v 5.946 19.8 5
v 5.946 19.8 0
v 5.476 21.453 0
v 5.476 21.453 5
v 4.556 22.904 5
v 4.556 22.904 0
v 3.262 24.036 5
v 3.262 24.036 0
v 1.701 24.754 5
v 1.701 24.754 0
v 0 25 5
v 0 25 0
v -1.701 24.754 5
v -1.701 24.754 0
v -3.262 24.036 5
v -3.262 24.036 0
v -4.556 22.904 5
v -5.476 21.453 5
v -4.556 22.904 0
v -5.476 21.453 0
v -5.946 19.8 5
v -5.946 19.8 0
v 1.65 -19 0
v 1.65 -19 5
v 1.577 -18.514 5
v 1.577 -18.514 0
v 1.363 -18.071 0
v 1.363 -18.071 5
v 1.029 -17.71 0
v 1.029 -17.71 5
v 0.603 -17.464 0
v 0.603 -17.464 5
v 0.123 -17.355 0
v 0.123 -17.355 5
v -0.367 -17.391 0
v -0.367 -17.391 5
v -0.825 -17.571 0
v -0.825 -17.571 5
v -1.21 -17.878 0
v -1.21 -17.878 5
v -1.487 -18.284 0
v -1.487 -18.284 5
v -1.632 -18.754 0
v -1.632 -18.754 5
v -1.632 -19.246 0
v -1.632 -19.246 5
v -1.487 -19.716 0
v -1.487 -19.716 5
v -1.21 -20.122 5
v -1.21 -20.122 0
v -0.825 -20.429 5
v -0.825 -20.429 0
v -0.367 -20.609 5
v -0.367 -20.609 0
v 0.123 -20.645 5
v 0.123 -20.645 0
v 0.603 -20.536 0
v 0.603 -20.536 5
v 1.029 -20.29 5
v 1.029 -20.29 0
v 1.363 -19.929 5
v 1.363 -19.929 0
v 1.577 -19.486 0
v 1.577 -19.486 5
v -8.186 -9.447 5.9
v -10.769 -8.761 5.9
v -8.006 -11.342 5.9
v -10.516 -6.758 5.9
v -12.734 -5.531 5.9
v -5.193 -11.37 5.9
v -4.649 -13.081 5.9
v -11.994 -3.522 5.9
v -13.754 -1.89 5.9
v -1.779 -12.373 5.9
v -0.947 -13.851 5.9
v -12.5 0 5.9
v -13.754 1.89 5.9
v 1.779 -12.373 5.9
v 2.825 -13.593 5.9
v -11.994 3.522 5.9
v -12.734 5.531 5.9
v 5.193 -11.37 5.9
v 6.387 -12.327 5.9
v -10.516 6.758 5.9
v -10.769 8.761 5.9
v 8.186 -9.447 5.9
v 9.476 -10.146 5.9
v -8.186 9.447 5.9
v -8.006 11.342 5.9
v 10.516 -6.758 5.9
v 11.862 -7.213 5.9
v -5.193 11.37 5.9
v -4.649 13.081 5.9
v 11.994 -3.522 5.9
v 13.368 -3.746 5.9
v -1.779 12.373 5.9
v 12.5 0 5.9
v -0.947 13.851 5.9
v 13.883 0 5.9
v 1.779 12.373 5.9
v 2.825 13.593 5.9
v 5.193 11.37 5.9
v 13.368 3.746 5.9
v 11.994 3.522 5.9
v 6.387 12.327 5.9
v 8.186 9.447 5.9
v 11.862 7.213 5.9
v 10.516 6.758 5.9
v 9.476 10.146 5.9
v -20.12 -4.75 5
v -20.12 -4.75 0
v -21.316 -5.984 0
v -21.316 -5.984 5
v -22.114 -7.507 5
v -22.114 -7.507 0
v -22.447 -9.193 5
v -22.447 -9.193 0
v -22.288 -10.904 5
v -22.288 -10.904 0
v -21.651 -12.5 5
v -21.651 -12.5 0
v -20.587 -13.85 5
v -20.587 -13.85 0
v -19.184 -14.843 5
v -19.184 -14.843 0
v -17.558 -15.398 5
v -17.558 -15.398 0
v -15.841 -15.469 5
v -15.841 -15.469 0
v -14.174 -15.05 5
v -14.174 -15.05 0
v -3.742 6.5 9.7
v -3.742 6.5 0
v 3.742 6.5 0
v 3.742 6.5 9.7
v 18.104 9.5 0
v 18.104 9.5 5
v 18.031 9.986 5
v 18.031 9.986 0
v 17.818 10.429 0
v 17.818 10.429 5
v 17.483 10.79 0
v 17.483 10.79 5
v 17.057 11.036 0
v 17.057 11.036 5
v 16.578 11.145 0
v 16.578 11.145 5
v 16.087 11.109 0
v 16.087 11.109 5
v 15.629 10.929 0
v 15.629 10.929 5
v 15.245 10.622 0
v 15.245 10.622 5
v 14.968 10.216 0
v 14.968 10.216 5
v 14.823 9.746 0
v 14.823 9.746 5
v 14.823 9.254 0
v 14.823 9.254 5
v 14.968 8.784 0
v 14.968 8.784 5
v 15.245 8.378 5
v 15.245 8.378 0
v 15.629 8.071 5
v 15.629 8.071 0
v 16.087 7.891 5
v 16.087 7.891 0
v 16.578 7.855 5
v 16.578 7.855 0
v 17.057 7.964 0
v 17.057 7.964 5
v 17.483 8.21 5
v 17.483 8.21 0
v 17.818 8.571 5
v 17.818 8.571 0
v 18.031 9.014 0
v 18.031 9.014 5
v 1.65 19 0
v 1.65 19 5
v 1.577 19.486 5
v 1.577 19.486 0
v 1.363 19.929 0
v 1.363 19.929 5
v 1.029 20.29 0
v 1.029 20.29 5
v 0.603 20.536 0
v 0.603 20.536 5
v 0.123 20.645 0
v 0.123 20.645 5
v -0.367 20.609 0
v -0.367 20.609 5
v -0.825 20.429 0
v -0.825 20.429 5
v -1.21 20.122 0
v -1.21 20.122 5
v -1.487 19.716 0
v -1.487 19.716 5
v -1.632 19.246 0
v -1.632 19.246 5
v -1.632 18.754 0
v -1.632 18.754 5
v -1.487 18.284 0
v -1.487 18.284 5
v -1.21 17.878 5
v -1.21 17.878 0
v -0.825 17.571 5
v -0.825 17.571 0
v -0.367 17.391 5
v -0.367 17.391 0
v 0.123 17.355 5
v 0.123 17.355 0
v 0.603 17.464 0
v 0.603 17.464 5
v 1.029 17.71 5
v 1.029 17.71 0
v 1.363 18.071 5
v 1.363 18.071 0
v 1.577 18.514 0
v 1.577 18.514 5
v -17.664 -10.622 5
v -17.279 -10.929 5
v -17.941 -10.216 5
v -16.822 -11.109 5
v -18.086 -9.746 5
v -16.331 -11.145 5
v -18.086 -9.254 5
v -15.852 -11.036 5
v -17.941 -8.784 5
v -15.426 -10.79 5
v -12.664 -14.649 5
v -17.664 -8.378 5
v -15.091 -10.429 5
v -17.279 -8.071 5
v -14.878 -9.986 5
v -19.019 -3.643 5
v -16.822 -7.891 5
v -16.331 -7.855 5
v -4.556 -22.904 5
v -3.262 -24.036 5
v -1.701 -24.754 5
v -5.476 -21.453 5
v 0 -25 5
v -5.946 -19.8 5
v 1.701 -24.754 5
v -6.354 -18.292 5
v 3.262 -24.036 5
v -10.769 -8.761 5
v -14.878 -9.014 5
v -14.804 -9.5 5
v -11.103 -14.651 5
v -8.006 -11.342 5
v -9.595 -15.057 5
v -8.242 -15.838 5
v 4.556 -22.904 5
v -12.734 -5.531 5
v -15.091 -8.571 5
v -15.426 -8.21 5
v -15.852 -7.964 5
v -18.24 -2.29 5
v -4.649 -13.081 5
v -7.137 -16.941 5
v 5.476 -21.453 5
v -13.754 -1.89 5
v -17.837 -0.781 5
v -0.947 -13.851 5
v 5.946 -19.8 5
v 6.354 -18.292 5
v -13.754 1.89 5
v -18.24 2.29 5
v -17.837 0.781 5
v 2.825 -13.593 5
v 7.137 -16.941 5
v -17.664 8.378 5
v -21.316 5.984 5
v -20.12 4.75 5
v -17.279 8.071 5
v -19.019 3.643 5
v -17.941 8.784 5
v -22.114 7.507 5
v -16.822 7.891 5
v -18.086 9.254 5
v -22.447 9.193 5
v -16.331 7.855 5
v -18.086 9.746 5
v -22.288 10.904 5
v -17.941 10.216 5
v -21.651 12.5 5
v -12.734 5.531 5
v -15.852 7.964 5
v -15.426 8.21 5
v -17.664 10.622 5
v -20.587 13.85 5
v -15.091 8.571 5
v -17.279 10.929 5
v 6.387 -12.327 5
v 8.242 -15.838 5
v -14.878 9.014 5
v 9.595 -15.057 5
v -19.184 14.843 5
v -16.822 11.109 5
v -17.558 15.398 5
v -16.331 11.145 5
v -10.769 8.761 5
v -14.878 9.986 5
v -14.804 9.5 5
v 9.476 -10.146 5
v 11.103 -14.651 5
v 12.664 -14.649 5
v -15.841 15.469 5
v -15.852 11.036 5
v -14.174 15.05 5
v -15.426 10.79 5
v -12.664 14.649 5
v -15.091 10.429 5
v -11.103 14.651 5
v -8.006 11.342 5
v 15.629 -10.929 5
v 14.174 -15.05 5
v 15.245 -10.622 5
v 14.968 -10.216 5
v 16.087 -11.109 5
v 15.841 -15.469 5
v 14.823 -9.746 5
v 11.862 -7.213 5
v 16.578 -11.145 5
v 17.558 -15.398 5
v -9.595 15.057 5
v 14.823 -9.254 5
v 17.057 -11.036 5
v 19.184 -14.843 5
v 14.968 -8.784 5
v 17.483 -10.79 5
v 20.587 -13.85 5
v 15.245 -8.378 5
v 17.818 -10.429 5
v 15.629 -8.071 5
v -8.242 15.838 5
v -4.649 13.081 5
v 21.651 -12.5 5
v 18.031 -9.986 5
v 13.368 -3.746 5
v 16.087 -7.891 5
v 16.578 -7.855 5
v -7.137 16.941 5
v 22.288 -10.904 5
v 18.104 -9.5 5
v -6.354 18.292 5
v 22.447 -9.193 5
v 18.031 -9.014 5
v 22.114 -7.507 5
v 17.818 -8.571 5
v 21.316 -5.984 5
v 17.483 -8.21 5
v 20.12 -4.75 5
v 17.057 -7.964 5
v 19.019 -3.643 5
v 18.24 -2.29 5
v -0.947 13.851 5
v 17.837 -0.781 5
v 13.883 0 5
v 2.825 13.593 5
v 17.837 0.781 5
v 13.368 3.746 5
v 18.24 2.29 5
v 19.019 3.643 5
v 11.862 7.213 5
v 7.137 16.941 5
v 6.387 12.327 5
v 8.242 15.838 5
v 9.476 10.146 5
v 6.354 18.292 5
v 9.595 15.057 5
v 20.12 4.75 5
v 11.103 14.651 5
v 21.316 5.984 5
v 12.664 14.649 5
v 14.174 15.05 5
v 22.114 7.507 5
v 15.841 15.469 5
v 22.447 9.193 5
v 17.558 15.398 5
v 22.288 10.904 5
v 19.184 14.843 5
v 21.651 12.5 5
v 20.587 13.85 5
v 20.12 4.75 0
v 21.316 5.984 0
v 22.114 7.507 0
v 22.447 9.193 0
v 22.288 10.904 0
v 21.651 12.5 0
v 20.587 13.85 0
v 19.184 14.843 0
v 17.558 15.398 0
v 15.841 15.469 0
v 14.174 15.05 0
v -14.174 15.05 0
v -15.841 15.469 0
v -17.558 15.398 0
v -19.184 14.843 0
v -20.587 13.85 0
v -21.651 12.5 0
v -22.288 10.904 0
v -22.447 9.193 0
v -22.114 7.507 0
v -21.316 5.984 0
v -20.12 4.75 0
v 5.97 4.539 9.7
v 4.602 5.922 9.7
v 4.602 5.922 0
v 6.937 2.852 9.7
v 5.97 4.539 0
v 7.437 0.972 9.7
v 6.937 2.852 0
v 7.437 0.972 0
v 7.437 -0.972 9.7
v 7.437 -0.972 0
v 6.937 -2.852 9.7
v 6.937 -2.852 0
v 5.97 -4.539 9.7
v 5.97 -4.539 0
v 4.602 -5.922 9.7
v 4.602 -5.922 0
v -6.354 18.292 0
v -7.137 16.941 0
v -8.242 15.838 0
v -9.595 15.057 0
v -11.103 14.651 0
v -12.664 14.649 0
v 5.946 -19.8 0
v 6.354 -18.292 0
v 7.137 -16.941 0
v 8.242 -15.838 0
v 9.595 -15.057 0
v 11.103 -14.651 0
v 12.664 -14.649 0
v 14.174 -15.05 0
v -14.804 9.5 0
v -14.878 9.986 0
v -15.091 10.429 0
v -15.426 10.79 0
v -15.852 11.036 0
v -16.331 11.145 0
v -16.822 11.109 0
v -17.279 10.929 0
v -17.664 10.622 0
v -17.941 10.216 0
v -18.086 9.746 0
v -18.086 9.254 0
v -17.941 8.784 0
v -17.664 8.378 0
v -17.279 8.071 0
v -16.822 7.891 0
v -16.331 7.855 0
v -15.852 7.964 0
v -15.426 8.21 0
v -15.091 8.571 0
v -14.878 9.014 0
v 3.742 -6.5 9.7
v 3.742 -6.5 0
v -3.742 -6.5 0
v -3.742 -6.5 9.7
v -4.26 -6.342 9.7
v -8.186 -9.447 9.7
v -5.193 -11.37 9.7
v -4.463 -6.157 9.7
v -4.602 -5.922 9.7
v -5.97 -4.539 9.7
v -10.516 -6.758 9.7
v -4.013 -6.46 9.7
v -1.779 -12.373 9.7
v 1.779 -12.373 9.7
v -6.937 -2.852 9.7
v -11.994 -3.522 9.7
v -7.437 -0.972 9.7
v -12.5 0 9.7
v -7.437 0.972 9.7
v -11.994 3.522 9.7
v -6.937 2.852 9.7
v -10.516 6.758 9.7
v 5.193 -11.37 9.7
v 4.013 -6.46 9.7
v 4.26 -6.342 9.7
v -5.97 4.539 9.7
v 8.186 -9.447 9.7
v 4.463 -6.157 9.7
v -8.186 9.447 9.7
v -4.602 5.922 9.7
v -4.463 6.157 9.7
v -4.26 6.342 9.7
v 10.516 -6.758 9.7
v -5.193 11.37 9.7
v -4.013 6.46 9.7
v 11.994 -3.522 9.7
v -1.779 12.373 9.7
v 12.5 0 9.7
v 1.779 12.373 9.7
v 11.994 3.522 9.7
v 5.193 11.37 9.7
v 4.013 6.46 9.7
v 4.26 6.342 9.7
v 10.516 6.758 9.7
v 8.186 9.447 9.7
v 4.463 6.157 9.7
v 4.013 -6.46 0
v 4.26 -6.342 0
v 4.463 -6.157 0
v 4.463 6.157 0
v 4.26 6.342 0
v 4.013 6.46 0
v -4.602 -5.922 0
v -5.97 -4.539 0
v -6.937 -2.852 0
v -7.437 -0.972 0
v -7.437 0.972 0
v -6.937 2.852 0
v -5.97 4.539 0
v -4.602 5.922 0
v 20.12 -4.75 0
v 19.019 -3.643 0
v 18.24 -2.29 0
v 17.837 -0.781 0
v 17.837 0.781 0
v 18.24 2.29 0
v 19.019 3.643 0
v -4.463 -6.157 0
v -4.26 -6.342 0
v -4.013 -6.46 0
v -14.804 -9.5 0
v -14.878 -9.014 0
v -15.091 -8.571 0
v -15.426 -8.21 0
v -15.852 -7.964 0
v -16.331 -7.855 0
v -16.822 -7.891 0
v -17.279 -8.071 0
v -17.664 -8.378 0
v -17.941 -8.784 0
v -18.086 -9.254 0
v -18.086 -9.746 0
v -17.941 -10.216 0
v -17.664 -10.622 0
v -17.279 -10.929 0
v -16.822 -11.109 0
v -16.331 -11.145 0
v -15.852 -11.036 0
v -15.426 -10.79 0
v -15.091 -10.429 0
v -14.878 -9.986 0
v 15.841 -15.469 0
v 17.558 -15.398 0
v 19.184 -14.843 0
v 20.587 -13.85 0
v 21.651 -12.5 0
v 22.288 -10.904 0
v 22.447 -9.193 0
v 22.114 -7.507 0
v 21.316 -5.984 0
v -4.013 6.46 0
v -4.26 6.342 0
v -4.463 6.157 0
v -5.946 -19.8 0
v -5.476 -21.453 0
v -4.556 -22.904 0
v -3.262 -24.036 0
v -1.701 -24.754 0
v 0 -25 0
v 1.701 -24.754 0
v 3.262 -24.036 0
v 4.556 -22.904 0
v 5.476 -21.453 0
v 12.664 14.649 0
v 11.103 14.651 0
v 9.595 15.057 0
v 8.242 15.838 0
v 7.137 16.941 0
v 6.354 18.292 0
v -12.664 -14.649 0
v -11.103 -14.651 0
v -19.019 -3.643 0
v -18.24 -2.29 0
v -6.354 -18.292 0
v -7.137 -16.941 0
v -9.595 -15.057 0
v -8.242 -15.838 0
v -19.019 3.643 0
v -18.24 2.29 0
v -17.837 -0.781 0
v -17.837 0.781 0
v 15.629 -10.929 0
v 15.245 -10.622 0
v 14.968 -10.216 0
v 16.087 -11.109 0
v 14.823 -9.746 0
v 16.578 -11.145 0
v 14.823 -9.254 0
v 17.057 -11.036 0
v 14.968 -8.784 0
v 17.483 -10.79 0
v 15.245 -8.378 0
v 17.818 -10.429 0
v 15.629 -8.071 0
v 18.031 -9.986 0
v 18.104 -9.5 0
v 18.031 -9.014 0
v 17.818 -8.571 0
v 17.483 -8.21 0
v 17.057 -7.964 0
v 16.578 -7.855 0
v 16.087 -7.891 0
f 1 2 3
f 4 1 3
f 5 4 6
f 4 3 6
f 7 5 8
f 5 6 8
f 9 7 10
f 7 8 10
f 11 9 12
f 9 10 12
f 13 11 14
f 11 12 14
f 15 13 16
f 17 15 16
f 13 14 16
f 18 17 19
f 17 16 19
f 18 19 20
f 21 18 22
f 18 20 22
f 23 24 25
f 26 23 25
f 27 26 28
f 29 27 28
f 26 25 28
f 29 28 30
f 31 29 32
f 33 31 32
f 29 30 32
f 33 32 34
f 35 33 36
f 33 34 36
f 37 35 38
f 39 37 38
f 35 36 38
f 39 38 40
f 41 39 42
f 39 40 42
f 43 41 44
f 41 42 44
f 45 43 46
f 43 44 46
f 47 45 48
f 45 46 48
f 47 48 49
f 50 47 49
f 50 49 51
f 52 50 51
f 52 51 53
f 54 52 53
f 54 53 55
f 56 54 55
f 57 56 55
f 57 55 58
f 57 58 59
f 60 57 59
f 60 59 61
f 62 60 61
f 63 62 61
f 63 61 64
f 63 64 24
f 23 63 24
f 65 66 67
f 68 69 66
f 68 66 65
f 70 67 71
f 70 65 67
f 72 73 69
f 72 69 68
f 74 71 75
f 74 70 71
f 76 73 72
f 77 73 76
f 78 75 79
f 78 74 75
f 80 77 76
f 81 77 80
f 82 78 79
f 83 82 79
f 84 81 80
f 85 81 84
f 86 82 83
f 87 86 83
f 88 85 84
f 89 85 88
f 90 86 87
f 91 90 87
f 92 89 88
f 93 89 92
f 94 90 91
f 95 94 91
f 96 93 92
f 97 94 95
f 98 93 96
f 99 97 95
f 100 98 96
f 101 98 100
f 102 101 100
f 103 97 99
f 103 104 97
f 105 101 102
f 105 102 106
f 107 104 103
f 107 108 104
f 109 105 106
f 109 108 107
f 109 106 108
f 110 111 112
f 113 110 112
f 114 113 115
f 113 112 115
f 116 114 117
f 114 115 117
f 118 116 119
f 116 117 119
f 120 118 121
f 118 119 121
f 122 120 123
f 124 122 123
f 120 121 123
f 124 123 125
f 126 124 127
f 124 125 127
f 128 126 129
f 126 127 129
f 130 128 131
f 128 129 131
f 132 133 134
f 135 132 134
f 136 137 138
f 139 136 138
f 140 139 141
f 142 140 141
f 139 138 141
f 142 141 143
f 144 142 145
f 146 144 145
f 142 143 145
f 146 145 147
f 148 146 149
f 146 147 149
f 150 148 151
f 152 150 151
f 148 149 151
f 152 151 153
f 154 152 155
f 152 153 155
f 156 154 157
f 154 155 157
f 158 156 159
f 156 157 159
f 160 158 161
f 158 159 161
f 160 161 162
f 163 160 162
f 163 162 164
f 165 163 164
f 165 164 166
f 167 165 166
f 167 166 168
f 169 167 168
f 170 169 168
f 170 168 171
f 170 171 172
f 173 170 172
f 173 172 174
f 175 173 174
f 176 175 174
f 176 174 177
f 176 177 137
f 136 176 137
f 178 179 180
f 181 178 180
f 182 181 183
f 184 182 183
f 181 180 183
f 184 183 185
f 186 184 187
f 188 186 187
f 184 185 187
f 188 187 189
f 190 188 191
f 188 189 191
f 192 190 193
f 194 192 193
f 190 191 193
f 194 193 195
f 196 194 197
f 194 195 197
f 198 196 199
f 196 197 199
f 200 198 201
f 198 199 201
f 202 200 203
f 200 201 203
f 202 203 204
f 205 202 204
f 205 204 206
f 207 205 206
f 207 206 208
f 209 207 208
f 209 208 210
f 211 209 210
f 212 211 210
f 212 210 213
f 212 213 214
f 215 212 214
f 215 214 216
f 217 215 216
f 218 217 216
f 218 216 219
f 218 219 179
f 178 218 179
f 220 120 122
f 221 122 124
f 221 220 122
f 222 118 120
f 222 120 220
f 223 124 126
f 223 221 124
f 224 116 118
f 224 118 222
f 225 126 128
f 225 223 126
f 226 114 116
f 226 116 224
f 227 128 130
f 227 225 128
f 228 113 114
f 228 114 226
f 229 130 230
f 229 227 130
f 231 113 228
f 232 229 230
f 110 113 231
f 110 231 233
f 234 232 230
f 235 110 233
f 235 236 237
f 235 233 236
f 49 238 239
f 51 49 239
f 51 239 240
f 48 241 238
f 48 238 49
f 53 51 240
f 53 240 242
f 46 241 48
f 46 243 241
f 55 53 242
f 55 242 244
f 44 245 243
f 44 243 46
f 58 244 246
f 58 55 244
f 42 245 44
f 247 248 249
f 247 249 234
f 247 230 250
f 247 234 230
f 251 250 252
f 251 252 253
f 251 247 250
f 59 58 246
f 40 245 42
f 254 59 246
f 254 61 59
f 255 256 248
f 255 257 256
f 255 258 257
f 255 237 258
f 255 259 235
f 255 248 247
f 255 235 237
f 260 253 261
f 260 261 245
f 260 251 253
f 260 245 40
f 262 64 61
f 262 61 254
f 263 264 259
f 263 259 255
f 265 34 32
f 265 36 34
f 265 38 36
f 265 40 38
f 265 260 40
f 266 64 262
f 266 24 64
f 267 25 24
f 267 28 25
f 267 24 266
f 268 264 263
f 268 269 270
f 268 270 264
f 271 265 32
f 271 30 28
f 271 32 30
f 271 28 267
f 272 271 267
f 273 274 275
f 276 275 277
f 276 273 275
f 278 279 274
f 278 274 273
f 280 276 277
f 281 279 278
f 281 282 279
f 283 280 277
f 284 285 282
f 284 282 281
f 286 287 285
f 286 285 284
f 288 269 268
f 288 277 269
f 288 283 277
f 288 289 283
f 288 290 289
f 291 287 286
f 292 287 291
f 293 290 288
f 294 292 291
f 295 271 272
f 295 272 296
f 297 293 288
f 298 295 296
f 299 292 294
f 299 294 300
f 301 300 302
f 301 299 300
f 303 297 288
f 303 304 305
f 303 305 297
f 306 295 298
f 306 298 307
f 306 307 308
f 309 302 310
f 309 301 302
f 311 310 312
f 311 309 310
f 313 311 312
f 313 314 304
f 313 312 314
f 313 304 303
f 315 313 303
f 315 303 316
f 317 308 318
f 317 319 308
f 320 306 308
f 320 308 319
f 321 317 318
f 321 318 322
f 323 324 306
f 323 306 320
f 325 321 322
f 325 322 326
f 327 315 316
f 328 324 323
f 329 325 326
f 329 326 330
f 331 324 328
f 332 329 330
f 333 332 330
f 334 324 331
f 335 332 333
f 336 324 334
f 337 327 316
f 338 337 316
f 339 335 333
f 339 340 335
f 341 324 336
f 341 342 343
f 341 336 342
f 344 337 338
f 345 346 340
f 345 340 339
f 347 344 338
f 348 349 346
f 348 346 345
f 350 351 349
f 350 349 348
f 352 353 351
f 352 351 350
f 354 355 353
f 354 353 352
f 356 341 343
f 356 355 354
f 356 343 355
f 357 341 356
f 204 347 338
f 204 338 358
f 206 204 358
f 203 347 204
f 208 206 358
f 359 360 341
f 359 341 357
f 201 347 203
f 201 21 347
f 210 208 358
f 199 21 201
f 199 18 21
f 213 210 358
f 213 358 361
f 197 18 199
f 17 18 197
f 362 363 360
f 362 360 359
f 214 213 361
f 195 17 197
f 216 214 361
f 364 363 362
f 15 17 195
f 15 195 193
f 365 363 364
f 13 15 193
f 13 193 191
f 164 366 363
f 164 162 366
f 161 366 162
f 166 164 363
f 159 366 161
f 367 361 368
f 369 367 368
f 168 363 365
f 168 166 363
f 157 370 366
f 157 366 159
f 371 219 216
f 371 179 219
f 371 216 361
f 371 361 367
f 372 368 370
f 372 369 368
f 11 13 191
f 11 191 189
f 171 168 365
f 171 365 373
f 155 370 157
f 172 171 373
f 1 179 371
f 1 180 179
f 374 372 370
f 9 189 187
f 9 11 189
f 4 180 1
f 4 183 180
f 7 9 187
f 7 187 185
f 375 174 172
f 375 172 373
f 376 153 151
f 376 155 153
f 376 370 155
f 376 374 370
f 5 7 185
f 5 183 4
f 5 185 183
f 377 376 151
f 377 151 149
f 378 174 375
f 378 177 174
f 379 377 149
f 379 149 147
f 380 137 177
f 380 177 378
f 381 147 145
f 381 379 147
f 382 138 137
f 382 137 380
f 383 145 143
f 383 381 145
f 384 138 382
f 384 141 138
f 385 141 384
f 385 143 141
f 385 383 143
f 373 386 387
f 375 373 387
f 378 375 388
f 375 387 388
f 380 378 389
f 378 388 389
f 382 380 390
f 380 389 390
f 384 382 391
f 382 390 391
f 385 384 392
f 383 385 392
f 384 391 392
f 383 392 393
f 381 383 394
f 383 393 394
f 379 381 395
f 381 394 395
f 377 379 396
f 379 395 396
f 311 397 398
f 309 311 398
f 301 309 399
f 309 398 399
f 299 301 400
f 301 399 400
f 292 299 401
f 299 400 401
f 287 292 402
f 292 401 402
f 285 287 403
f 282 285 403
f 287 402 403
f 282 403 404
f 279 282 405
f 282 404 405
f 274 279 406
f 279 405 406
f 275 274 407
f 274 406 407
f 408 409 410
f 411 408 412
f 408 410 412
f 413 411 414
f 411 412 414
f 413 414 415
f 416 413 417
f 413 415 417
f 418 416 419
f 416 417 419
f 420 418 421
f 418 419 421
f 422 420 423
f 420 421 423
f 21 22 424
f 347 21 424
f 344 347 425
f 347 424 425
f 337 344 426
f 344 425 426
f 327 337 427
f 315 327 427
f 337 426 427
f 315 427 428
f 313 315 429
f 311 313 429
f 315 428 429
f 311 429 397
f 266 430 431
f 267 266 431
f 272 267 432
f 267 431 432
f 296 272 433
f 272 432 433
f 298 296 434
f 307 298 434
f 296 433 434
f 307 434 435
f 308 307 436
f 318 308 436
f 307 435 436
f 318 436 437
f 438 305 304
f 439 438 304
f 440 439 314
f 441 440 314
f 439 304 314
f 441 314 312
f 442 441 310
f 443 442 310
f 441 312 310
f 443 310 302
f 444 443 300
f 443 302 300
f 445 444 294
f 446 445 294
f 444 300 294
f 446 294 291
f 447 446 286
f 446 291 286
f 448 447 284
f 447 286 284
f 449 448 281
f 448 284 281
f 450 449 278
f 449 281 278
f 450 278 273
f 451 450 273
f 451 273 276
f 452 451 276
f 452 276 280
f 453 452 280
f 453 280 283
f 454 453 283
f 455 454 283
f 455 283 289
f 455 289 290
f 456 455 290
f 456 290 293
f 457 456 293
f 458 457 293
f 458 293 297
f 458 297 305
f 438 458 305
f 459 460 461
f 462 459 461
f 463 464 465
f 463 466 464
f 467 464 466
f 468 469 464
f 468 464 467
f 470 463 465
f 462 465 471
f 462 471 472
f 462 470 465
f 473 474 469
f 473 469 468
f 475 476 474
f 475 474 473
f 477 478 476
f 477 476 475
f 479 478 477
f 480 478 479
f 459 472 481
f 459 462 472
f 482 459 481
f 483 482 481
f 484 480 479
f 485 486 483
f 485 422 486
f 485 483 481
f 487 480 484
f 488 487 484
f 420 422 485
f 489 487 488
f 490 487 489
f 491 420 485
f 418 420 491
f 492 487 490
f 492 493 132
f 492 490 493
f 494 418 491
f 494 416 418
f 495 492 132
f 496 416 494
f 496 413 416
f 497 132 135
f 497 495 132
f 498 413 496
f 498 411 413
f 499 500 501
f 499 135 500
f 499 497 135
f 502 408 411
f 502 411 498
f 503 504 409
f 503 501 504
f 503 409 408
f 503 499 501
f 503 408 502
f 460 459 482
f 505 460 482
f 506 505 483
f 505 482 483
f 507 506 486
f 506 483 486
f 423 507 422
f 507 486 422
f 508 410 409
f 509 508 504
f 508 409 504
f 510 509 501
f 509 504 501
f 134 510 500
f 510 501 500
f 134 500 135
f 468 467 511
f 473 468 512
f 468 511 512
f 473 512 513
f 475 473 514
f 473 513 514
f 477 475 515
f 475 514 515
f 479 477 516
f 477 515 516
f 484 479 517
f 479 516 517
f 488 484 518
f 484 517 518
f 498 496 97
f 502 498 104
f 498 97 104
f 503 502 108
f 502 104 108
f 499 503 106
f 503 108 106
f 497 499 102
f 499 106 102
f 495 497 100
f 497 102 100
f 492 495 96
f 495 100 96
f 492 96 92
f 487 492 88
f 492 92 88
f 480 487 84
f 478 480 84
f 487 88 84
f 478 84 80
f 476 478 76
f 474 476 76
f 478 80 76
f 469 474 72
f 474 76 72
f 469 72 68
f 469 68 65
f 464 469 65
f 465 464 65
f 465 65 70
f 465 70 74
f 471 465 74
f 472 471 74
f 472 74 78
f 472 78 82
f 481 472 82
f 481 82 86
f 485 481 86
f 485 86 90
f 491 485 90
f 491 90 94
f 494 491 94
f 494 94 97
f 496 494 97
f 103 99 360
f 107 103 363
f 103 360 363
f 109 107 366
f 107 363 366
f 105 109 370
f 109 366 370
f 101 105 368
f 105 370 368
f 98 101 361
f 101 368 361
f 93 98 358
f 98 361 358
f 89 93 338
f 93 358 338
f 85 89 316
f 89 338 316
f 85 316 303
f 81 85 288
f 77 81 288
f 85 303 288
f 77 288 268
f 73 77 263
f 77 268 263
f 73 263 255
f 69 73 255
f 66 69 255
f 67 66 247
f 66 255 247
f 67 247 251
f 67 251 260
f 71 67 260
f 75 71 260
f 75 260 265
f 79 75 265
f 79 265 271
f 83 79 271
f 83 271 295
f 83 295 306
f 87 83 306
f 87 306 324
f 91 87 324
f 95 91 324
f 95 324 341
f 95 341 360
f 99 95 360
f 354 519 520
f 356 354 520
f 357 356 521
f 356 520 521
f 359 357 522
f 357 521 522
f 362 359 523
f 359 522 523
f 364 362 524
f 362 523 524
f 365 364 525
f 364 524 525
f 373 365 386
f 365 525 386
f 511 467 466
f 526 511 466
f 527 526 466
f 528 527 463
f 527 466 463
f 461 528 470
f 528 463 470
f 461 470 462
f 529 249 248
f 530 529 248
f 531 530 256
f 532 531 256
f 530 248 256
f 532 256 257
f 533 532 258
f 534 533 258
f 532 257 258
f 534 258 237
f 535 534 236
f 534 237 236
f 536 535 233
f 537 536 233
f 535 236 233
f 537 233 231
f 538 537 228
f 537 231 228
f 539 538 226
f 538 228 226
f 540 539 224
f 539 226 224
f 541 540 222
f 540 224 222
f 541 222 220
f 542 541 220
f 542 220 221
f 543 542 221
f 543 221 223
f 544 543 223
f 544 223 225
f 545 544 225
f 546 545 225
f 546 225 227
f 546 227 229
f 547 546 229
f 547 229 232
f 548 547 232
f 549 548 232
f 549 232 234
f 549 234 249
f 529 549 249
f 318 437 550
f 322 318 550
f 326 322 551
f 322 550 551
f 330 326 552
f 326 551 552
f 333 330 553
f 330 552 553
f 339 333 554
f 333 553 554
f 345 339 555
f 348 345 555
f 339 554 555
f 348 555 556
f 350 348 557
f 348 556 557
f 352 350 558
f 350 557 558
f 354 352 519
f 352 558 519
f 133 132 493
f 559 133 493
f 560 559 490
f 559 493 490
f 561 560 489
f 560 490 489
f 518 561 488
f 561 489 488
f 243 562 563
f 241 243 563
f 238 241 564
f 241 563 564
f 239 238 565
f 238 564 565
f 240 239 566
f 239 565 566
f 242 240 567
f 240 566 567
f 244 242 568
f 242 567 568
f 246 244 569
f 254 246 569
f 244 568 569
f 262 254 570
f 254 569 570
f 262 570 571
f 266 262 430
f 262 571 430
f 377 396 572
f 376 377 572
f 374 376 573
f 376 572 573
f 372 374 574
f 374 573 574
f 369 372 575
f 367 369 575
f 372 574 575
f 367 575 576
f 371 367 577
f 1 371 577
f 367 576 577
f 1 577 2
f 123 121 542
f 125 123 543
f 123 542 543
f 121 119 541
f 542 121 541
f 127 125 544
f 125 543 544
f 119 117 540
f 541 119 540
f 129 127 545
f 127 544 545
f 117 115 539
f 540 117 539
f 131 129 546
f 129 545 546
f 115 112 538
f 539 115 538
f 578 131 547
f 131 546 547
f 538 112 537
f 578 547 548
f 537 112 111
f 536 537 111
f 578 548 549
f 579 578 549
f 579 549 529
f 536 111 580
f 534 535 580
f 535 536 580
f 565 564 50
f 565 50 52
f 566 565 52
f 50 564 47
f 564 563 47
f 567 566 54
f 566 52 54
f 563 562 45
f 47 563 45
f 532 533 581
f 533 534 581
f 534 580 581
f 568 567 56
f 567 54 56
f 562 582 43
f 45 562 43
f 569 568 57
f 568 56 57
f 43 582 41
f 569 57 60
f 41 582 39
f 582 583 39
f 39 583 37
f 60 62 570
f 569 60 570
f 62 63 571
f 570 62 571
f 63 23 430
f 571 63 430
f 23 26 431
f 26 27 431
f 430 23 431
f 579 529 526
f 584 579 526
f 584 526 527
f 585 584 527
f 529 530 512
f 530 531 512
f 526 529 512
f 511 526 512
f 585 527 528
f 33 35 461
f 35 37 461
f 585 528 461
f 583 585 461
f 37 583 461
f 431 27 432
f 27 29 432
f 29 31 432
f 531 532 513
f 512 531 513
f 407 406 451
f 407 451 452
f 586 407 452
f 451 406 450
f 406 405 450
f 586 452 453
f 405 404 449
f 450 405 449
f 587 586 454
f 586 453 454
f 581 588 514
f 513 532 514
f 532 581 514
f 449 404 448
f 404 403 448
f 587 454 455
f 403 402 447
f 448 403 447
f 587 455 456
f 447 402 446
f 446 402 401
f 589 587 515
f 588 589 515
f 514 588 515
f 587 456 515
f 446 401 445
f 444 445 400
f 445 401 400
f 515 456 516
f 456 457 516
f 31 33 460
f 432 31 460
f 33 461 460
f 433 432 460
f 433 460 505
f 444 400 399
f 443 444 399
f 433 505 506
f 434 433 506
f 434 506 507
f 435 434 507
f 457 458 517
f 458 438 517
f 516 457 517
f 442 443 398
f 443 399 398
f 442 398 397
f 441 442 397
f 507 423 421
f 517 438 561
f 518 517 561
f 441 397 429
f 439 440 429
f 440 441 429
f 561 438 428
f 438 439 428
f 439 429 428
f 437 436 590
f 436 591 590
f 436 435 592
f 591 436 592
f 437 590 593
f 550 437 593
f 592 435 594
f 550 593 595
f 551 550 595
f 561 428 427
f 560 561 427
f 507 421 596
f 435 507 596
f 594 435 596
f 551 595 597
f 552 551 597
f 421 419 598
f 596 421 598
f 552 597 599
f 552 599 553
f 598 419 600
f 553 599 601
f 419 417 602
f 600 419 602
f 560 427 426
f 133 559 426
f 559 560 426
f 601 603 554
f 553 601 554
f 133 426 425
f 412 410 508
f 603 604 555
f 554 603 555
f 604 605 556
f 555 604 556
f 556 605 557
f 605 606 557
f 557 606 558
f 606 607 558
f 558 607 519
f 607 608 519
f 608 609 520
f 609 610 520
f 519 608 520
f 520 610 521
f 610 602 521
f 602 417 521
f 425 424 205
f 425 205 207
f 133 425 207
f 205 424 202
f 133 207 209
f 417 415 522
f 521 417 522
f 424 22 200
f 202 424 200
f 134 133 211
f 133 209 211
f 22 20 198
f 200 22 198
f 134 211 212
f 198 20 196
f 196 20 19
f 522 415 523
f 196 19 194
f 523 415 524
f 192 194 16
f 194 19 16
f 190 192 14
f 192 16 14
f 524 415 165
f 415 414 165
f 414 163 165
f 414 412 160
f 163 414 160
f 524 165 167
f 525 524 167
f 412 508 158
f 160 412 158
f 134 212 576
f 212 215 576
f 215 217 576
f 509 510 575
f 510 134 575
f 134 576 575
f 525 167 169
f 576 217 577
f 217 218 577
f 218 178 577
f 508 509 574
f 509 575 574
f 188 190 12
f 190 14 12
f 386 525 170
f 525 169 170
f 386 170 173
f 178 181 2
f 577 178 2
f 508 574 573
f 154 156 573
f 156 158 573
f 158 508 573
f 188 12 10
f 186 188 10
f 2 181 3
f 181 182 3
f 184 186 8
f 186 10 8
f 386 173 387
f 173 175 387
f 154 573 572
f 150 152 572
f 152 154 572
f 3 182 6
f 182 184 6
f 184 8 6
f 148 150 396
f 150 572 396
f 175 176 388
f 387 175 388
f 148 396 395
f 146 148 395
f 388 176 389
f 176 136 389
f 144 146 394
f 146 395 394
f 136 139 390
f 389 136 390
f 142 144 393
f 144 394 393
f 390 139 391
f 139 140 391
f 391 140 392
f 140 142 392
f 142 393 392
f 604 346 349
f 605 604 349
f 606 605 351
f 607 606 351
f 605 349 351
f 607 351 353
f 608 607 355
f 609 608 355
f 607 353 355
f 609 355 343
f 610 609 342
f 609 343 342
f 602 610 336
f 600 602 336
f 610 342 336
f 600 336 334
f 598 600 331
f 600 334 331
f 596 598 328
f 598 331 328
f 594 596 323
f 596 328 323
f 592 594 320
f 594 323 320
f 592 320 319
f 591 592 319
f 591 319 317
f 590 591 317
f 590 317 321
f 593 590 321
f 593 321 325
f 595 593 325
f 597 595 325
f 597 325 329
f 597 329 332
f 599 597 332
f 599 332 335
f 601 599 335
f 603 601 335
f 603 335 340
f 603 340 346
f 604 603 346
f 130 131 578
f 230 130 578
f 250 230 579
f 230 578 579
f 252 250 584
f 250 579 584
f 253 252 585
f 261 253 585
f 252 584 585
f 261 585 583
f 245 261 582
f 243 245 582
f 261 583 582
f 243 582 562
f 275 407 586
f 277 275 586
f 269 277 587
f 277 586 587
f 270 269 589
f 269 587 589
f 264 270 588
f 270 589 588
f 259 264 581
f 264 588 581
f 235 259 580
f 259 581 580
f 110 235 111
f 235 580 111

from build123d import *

# Parameters (mm, degrees)
EXTRUDE_1_DEPTH     = 5
SKETCH_1_3_R        = 13.883
EXTRUDE_2_DEPTH     = 5.9
SKETCH_1_4_R        = 12.5
EXTRUDE_3_DEPTH     = 9.7
CUT_EXTRUDE_1_DEPTH = 35.975617108
M4X0_7_1_D          = 3.3
SKETCH_5_R          = 0.92977942
CUT_EXTRUDE_2_DEPTH = 35.975617108


with BuildPart() as part:
    # ｽｹｯﾁ1 → ﾎﾞｽ - 押し出し1 (new body)
    with BuildSketch(Plane.XY):
        with BuildLine():
            ThreePointArc((5.946480455, 19.799606275), (0, 25), (-5.946480455, 19.799606275))
            ThreePointArc((-5.946480455, 19.799606275), (-8.892960911, 15.403060127), (-14.173721791, 15.049606275))
            ThreePointArc((-14.173721791, 15.049606275), (-21.650635095, 12.5), (-20.120202247, 4.75))
            ThreePointArc((-20.120202247, 4.75), (-17.785921821, 0), (-20.120202247, -4.75))
            ThreePointArc((-20.120202247, -4.75), (-21.650635095, -12.5), (-14.173721791, -15.049606275))
            ThreePointArc((-14.173721791, -15.049606275), (-8.892960911, -15.403060127), (-5.946480455, -19.799606275))
            ThreePointArc((-5.946480455, -19.799606275), (0, -25), (5.946480455, -19.799606275))
            ThreePointArc((5.946480455, -19.799606275), (8.892960911, -15.403060127), (14.173721791, -15.049606275))
            ThreePointArc((14.173721791, -15.049606275), (21.650635095, -12.5), (20.120202247, -4.75))
            ThreePointArc((20.120202247, -4.75), (17.785921821, 0), (20.120202247, 4.75))
            ThreePointArc((20.120202247, 4.75), (21.650635095, 12.5), (14.173721791, 15.049606275))
            ThreePointArc((14.173721791, 15.049606275), (8.892960911, 15.403060127), (5.946480455, 19.799606275))
        make_face()
    extrude(amount=EXTRUDE_1_DEPTH)

    # ｽｹｯﾁ1<3> → ﾎﾞｽ - 押し出し2 (add)
    with BuildSketch(Plane.XY):
        Circle(SKETCH_1_3_R)
    extrude(amount=EXTRUDE_2_DEPTH)

    # ｽｹｯﾁ1<4> → ﾎﾞｽ - 押し出し3 (add)
    with BuildSketch(Plane.XY):
        Circle(SKETCH_1_4_R)
    extrude(amount=EXTRUDE_3_DEPTH)

    # ｽｹｯﾁ1<5> → ｶｯﾄ - 押し出し1 (cut, through all)
    with BuildSketch(Plane.XY):
        with BuildLine():
            Line((-3.741657387, 6.5), (3.741657387, 6.5))
            ThreePointArc((3.741657387, 6.5), (7.5, 0), (3.741657387, -6.5))
            Line((3.741657387, -6.5), (-3.741657387, -6.5))
            ThreePointArc((-3.741657387, -6.5), (-7.5, 0), (-3.741657387, 6.5))
        make_face()
    extrude(amount=CUT_EXTRUDE_1_DEPTH, mode=Mode.SUBTRACT)

    # M4x0.7 ねじ穴1 (through all)
    with Locations(Plane(origin=(0, 19, 0), x_dir=(-1, 0, 0), z_dir=(0, 0, -1))):
        with Locations((0, 0), (-16.454482672, -9.5), (-16.454482672, -28.5), (0, -38), (16.454482672, -28.5), (16.454482672, -9.5)):
            Hole(M4X0_7_1_D / 2)

    # ｽｹｯﾁ5 → ｶｯﾄ - 押し出し2 (cut, through all)
    with BuildSketch(Plane.XY.offset(9.7)):
        with Locations((3.741657387, 5.57022058)):
            Circle(SKETCH_5_R)
        with Locations((3.741657387, -5.57022058)):
            Circle(SKETCH_5_R)
        with Locations((-3.741657387, -5.57022058)):
            Circle(SKETCH_5_R)
        with Locations((-3.741657387, 5.57022058)):
            Circle(SKETCH_5_R)
    extrude(amount=-CUT_EXTRUDE_2_DEPTH, mode=Mode.SUBTRACT)


solid = part.part
